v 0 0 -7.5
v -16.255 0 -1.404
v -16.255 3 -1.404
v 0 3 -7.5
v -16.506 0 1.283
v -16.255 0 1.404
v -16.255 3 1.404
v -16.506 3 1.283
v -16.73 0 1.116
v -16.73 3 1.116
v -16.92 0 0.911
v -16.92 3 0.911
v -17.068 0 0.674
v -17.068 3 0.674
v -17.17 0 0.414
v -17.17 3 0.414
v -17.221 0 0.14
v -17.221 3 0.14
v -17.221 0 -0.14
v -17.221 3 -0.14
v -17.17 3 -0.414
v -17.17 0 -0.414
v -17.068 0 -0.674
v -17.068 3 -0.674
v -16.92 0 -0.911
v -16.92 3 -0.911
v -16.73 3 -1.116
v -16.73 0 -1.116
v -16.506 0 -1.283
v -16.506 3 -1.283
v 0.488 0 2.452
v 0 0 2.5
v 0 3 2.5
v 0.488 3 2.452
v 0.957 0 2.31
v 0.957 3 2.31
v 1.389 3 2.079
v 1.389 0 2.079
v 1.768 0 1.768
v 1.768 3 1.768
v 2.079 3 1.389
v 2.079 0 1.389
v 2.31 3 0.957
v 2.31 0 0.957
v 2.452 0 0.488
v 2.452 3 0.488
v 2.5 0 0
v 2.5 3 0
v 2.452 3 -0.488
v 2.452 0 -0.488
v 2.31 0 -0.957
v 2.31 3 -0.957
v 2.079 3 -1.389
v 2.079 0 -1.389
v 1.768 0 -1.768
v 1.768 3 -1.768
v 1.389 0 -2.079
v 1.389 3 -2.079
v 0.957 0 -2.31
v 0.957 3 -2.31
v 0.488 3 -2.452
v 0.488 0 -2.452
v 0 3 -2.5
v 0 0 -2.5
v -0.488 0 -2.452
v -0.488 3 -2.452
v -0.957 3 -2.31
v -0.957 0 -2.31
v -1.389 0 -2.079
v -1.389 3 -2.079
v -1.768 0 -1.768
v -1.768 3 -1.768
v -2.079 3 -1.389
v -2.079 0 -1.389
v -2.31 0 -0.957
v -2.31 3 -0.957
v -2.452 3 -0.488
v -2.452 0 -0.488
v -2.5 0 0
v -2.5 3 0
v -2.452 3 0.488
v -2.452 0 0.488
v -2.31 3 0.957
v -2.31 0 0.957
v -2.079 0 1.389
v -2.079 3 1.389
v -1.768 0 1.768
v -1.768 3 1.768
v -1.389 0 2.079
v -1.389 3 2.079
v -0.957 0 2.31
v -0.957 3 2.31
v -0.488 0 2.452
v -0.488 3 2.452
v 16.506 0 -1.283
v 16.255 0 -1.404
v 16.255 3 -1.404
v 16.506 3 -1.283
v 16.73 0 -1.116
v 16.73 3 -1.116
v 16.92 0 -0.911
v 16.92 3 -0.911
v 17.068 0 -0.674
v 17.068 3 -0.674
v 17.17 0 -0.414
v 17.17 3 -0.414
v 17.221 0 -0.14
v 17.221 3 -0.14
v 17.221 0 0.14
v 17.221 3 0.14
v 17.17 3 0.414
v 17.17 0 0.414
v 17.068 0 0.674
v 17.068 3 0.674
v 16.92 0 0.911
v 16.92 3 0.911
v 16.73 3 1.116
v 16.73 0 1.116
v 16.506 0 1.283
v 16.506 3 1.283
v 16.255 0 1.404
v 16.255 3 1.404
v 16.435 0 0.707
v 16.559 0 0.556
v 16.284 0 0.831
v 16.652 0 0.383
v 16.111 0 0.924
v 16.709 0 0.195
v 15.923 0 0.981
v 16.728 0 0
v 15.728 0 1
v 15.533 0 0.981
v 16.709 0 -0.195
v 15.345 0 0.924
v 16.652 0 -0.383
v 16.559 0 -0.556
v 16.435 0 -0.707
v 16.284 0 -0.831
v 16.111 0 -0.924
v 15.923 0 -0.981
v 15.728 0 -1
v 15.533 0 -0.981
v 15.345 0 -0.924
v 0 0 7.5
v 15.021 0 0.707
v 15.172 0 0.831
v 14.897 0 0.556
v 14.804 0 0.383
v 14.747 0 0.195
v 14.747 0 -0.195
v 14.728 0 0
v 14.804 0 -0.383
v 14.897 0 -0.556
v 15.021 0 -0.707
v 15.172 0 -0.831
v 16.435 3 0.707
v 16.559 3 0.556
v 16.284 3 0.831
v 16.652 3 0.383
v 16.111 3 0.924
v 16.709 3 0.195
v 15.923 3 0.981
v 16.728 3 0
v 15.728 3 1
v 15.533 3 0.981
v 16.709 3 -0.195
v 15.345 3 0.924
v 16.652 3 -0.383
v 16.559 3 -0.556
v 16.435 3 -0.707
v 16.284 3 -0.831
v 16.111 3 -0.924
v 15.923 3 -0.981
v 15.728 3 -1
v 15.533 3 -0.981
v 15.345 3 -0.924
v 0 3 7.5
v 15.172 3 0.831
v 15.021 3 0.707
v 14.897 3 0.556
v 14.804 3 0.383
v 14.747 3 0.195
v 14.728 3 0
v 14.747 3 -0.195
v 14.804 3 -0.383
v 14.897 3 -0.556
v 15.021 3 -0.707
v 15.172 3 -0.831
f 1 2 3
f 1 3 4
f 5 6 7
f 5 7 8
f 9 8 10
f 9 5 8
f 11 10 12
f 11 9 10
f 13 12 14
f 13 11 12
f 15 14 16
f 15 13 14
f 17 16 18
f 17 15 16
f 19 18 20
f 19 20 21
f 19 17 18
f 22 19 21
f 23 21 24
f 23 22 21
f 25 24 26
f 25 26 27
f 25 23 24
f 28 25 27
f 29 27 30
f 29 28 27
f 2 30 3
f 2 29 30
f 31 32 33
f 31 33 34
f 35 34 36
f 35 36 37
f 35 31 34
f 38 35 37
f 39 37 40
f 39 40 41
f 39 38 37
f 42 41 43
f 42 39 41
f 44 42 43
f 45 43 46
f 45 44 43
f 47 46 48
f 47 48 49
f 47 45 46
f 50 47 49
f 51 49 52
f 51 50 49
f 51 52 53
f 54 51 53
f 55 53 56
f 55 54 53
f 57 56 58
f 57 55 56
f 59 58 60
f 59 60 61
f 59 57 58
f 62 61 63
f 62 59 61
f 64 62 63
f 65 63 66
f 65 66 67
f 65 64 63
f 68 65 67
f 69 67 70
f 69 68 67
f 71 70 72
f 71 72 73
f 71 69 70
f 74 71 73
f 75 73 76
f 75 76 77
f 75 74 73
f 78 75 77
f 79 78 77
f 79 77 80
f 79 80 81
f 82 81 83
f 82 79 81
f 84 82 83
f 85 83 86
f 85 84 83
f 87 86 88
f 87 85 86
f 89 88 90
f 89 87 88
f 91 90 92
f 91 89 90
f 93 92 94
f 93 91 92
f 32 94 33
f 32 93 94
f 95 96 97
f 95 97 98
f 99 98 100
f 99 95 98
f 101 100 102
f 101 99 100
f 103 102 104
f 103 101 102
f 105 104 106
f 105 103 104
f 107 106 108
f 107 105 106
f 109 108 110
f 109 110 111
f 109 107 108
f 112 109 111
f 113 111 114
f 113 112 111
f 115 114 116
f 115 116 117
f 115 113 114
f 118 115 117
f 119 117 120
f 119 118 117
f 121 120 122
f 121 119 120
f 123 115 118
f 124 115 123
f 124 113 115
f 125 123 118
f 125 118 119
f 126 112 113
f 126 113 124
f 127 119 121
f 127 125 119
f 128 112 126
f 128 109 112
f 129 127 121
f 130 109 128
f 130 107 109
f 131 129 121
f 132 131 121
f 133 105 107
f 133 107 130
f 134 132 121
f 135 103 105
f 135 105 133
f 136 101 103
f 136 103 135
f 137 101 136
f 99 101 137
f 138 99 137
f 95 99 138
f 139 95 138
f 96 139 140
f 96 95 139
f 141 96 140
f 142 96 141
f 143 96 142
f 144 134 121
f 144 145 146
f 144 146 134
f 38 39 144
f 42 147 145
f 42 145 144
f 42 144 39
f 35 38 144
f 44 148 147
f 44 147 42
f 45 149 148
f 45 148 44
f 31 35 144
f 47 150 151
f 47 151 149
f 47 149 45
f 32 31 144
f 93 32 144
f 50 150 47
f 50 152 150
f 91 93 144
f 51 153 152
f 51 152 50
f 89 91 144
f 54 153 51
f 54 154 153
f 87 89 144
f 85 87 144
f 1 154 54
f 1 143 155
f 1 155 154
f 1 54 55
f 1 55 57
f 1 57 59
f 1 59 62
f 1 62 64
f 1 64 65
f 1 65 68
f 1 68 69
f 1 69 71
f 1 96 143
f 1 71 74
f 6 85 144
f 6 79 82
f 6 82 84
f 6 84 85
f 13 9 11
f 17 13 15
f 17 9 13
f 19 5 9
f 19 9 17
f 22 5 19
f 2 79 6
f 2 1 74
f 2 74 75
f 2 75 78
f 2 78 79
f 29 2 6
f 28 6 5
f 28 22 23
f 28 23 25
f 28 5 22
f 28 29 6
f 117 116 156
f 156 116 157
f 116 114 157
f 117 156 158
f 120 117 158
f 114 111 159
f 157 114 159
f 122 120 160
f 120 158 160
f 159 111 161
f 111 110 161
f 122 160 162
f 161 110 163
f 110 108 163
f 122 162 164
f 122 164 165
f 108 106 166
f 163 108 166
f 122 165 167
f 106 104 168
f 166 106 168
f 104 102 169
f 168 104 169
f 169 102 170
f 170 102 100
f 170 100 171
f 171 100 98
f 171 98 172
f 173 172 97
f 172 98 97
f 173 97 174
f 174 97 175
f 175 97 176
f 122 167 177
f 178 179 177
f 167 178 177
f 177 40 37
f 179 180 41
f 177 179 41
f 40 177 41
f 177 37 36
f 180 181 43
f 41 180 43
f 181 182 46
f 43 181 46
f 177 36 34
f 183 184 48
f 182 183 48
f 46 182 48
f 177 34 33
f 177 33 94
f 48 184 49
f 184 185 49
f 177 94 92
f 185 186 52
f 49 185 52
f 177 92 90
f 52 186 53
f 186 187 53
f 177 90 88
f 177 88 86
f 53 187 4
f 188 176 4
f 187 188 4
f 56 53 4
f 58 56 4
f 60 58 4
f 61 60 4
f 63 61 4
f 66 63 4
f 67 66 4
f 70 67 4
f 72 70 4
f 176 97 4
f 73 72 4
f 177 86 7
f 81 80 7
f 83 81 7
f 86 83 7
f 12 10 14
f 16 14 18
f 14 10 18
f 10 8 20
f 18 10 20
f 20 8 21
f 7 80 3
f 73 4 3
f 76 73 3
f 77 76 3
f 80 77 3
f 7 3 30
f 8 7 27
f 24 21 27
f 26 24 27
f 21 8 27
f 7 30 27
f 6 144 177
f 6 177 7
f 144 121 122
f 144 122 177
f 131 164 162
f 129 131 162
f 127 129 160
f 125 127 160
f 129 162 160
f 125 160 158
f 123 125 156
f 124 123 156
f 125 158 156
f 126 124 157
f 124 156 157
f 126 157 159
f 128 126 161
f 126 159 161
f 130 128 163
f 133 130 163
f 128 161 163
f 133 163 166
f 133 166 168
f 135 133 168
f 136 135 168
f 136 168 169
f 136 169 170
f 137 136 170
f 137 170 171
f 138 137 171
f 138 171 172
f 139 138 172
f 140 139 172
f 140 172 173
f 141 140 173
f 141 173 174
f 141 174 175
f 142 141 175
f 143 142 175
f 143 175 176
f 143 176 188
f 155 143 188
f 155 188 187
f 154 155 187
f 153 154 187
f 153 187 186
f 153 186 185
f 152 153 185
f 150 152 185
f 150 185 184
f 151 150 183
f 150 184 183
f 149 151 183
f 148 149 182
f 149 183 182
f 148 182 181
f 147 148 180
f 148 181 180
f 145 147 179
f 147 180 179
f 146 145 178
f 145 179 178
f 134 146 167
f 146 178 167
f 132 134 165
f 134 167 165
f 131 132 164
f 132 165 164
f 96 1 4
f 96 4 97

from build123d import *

# Parameters (mm, degrees)
SKETCH_1_R          = 2.5
EXTRUDE_1_DEPTH     = 3
SKETCH_3_R          = 1
CUT_EXTRUDE_1_DEPTH = 20.02771451


with BuildPart() as part:
    # 草圖1 → 填料-伸長1 (new body)
    with BuildSketch(Plane(origin=(0, 0, 0), x_dir=(1, 0, 0), z_dir=(0, 1, 0))):
        with BuildLine():
            Line((-16.25468329, 1.404493766), (0, 7.5))
            Line((0, 7.5), (16.25468329, 1.404493766))
            ThreePointArc((16.25468329, 1.404493766), (17.227998127, 0), (16.25468329, -1.404493766))
            Line((16.25468329, -1.404493766), (0, -7.5))
            Line((0, -7.5), (-16.25468329, -1.404493766))
            ThreePointArc((-16.25468329, -1.404493766), (-17.227998127, 0), (-16.25468329, 1.404493766))
        make_face()
        with Locations(Location((0, 0, 0), (0, 0, 270))):
            Circle(SKETCH_1_R, mode=Mode.SUBTRACT)
    extrude(amount=EXTRUDE_1_DEPTH)

    # 草圖3 → 除料-伸長1 (cut, through all)
    with BuildSketch(Plane(origin=(0, 3, 0), x_dir=(1, 0, 0), z_dir=(0, 1, 0))):
        with Locations(Location((15.727998127, 0, 0), (0, 0, 270))):
            Circle(SKETCH_3_R)
    extrude(amount=-CUT_EXTRUDE_1_DEPTH, mode=Mode.SUBTRACT)


solid = part.part
